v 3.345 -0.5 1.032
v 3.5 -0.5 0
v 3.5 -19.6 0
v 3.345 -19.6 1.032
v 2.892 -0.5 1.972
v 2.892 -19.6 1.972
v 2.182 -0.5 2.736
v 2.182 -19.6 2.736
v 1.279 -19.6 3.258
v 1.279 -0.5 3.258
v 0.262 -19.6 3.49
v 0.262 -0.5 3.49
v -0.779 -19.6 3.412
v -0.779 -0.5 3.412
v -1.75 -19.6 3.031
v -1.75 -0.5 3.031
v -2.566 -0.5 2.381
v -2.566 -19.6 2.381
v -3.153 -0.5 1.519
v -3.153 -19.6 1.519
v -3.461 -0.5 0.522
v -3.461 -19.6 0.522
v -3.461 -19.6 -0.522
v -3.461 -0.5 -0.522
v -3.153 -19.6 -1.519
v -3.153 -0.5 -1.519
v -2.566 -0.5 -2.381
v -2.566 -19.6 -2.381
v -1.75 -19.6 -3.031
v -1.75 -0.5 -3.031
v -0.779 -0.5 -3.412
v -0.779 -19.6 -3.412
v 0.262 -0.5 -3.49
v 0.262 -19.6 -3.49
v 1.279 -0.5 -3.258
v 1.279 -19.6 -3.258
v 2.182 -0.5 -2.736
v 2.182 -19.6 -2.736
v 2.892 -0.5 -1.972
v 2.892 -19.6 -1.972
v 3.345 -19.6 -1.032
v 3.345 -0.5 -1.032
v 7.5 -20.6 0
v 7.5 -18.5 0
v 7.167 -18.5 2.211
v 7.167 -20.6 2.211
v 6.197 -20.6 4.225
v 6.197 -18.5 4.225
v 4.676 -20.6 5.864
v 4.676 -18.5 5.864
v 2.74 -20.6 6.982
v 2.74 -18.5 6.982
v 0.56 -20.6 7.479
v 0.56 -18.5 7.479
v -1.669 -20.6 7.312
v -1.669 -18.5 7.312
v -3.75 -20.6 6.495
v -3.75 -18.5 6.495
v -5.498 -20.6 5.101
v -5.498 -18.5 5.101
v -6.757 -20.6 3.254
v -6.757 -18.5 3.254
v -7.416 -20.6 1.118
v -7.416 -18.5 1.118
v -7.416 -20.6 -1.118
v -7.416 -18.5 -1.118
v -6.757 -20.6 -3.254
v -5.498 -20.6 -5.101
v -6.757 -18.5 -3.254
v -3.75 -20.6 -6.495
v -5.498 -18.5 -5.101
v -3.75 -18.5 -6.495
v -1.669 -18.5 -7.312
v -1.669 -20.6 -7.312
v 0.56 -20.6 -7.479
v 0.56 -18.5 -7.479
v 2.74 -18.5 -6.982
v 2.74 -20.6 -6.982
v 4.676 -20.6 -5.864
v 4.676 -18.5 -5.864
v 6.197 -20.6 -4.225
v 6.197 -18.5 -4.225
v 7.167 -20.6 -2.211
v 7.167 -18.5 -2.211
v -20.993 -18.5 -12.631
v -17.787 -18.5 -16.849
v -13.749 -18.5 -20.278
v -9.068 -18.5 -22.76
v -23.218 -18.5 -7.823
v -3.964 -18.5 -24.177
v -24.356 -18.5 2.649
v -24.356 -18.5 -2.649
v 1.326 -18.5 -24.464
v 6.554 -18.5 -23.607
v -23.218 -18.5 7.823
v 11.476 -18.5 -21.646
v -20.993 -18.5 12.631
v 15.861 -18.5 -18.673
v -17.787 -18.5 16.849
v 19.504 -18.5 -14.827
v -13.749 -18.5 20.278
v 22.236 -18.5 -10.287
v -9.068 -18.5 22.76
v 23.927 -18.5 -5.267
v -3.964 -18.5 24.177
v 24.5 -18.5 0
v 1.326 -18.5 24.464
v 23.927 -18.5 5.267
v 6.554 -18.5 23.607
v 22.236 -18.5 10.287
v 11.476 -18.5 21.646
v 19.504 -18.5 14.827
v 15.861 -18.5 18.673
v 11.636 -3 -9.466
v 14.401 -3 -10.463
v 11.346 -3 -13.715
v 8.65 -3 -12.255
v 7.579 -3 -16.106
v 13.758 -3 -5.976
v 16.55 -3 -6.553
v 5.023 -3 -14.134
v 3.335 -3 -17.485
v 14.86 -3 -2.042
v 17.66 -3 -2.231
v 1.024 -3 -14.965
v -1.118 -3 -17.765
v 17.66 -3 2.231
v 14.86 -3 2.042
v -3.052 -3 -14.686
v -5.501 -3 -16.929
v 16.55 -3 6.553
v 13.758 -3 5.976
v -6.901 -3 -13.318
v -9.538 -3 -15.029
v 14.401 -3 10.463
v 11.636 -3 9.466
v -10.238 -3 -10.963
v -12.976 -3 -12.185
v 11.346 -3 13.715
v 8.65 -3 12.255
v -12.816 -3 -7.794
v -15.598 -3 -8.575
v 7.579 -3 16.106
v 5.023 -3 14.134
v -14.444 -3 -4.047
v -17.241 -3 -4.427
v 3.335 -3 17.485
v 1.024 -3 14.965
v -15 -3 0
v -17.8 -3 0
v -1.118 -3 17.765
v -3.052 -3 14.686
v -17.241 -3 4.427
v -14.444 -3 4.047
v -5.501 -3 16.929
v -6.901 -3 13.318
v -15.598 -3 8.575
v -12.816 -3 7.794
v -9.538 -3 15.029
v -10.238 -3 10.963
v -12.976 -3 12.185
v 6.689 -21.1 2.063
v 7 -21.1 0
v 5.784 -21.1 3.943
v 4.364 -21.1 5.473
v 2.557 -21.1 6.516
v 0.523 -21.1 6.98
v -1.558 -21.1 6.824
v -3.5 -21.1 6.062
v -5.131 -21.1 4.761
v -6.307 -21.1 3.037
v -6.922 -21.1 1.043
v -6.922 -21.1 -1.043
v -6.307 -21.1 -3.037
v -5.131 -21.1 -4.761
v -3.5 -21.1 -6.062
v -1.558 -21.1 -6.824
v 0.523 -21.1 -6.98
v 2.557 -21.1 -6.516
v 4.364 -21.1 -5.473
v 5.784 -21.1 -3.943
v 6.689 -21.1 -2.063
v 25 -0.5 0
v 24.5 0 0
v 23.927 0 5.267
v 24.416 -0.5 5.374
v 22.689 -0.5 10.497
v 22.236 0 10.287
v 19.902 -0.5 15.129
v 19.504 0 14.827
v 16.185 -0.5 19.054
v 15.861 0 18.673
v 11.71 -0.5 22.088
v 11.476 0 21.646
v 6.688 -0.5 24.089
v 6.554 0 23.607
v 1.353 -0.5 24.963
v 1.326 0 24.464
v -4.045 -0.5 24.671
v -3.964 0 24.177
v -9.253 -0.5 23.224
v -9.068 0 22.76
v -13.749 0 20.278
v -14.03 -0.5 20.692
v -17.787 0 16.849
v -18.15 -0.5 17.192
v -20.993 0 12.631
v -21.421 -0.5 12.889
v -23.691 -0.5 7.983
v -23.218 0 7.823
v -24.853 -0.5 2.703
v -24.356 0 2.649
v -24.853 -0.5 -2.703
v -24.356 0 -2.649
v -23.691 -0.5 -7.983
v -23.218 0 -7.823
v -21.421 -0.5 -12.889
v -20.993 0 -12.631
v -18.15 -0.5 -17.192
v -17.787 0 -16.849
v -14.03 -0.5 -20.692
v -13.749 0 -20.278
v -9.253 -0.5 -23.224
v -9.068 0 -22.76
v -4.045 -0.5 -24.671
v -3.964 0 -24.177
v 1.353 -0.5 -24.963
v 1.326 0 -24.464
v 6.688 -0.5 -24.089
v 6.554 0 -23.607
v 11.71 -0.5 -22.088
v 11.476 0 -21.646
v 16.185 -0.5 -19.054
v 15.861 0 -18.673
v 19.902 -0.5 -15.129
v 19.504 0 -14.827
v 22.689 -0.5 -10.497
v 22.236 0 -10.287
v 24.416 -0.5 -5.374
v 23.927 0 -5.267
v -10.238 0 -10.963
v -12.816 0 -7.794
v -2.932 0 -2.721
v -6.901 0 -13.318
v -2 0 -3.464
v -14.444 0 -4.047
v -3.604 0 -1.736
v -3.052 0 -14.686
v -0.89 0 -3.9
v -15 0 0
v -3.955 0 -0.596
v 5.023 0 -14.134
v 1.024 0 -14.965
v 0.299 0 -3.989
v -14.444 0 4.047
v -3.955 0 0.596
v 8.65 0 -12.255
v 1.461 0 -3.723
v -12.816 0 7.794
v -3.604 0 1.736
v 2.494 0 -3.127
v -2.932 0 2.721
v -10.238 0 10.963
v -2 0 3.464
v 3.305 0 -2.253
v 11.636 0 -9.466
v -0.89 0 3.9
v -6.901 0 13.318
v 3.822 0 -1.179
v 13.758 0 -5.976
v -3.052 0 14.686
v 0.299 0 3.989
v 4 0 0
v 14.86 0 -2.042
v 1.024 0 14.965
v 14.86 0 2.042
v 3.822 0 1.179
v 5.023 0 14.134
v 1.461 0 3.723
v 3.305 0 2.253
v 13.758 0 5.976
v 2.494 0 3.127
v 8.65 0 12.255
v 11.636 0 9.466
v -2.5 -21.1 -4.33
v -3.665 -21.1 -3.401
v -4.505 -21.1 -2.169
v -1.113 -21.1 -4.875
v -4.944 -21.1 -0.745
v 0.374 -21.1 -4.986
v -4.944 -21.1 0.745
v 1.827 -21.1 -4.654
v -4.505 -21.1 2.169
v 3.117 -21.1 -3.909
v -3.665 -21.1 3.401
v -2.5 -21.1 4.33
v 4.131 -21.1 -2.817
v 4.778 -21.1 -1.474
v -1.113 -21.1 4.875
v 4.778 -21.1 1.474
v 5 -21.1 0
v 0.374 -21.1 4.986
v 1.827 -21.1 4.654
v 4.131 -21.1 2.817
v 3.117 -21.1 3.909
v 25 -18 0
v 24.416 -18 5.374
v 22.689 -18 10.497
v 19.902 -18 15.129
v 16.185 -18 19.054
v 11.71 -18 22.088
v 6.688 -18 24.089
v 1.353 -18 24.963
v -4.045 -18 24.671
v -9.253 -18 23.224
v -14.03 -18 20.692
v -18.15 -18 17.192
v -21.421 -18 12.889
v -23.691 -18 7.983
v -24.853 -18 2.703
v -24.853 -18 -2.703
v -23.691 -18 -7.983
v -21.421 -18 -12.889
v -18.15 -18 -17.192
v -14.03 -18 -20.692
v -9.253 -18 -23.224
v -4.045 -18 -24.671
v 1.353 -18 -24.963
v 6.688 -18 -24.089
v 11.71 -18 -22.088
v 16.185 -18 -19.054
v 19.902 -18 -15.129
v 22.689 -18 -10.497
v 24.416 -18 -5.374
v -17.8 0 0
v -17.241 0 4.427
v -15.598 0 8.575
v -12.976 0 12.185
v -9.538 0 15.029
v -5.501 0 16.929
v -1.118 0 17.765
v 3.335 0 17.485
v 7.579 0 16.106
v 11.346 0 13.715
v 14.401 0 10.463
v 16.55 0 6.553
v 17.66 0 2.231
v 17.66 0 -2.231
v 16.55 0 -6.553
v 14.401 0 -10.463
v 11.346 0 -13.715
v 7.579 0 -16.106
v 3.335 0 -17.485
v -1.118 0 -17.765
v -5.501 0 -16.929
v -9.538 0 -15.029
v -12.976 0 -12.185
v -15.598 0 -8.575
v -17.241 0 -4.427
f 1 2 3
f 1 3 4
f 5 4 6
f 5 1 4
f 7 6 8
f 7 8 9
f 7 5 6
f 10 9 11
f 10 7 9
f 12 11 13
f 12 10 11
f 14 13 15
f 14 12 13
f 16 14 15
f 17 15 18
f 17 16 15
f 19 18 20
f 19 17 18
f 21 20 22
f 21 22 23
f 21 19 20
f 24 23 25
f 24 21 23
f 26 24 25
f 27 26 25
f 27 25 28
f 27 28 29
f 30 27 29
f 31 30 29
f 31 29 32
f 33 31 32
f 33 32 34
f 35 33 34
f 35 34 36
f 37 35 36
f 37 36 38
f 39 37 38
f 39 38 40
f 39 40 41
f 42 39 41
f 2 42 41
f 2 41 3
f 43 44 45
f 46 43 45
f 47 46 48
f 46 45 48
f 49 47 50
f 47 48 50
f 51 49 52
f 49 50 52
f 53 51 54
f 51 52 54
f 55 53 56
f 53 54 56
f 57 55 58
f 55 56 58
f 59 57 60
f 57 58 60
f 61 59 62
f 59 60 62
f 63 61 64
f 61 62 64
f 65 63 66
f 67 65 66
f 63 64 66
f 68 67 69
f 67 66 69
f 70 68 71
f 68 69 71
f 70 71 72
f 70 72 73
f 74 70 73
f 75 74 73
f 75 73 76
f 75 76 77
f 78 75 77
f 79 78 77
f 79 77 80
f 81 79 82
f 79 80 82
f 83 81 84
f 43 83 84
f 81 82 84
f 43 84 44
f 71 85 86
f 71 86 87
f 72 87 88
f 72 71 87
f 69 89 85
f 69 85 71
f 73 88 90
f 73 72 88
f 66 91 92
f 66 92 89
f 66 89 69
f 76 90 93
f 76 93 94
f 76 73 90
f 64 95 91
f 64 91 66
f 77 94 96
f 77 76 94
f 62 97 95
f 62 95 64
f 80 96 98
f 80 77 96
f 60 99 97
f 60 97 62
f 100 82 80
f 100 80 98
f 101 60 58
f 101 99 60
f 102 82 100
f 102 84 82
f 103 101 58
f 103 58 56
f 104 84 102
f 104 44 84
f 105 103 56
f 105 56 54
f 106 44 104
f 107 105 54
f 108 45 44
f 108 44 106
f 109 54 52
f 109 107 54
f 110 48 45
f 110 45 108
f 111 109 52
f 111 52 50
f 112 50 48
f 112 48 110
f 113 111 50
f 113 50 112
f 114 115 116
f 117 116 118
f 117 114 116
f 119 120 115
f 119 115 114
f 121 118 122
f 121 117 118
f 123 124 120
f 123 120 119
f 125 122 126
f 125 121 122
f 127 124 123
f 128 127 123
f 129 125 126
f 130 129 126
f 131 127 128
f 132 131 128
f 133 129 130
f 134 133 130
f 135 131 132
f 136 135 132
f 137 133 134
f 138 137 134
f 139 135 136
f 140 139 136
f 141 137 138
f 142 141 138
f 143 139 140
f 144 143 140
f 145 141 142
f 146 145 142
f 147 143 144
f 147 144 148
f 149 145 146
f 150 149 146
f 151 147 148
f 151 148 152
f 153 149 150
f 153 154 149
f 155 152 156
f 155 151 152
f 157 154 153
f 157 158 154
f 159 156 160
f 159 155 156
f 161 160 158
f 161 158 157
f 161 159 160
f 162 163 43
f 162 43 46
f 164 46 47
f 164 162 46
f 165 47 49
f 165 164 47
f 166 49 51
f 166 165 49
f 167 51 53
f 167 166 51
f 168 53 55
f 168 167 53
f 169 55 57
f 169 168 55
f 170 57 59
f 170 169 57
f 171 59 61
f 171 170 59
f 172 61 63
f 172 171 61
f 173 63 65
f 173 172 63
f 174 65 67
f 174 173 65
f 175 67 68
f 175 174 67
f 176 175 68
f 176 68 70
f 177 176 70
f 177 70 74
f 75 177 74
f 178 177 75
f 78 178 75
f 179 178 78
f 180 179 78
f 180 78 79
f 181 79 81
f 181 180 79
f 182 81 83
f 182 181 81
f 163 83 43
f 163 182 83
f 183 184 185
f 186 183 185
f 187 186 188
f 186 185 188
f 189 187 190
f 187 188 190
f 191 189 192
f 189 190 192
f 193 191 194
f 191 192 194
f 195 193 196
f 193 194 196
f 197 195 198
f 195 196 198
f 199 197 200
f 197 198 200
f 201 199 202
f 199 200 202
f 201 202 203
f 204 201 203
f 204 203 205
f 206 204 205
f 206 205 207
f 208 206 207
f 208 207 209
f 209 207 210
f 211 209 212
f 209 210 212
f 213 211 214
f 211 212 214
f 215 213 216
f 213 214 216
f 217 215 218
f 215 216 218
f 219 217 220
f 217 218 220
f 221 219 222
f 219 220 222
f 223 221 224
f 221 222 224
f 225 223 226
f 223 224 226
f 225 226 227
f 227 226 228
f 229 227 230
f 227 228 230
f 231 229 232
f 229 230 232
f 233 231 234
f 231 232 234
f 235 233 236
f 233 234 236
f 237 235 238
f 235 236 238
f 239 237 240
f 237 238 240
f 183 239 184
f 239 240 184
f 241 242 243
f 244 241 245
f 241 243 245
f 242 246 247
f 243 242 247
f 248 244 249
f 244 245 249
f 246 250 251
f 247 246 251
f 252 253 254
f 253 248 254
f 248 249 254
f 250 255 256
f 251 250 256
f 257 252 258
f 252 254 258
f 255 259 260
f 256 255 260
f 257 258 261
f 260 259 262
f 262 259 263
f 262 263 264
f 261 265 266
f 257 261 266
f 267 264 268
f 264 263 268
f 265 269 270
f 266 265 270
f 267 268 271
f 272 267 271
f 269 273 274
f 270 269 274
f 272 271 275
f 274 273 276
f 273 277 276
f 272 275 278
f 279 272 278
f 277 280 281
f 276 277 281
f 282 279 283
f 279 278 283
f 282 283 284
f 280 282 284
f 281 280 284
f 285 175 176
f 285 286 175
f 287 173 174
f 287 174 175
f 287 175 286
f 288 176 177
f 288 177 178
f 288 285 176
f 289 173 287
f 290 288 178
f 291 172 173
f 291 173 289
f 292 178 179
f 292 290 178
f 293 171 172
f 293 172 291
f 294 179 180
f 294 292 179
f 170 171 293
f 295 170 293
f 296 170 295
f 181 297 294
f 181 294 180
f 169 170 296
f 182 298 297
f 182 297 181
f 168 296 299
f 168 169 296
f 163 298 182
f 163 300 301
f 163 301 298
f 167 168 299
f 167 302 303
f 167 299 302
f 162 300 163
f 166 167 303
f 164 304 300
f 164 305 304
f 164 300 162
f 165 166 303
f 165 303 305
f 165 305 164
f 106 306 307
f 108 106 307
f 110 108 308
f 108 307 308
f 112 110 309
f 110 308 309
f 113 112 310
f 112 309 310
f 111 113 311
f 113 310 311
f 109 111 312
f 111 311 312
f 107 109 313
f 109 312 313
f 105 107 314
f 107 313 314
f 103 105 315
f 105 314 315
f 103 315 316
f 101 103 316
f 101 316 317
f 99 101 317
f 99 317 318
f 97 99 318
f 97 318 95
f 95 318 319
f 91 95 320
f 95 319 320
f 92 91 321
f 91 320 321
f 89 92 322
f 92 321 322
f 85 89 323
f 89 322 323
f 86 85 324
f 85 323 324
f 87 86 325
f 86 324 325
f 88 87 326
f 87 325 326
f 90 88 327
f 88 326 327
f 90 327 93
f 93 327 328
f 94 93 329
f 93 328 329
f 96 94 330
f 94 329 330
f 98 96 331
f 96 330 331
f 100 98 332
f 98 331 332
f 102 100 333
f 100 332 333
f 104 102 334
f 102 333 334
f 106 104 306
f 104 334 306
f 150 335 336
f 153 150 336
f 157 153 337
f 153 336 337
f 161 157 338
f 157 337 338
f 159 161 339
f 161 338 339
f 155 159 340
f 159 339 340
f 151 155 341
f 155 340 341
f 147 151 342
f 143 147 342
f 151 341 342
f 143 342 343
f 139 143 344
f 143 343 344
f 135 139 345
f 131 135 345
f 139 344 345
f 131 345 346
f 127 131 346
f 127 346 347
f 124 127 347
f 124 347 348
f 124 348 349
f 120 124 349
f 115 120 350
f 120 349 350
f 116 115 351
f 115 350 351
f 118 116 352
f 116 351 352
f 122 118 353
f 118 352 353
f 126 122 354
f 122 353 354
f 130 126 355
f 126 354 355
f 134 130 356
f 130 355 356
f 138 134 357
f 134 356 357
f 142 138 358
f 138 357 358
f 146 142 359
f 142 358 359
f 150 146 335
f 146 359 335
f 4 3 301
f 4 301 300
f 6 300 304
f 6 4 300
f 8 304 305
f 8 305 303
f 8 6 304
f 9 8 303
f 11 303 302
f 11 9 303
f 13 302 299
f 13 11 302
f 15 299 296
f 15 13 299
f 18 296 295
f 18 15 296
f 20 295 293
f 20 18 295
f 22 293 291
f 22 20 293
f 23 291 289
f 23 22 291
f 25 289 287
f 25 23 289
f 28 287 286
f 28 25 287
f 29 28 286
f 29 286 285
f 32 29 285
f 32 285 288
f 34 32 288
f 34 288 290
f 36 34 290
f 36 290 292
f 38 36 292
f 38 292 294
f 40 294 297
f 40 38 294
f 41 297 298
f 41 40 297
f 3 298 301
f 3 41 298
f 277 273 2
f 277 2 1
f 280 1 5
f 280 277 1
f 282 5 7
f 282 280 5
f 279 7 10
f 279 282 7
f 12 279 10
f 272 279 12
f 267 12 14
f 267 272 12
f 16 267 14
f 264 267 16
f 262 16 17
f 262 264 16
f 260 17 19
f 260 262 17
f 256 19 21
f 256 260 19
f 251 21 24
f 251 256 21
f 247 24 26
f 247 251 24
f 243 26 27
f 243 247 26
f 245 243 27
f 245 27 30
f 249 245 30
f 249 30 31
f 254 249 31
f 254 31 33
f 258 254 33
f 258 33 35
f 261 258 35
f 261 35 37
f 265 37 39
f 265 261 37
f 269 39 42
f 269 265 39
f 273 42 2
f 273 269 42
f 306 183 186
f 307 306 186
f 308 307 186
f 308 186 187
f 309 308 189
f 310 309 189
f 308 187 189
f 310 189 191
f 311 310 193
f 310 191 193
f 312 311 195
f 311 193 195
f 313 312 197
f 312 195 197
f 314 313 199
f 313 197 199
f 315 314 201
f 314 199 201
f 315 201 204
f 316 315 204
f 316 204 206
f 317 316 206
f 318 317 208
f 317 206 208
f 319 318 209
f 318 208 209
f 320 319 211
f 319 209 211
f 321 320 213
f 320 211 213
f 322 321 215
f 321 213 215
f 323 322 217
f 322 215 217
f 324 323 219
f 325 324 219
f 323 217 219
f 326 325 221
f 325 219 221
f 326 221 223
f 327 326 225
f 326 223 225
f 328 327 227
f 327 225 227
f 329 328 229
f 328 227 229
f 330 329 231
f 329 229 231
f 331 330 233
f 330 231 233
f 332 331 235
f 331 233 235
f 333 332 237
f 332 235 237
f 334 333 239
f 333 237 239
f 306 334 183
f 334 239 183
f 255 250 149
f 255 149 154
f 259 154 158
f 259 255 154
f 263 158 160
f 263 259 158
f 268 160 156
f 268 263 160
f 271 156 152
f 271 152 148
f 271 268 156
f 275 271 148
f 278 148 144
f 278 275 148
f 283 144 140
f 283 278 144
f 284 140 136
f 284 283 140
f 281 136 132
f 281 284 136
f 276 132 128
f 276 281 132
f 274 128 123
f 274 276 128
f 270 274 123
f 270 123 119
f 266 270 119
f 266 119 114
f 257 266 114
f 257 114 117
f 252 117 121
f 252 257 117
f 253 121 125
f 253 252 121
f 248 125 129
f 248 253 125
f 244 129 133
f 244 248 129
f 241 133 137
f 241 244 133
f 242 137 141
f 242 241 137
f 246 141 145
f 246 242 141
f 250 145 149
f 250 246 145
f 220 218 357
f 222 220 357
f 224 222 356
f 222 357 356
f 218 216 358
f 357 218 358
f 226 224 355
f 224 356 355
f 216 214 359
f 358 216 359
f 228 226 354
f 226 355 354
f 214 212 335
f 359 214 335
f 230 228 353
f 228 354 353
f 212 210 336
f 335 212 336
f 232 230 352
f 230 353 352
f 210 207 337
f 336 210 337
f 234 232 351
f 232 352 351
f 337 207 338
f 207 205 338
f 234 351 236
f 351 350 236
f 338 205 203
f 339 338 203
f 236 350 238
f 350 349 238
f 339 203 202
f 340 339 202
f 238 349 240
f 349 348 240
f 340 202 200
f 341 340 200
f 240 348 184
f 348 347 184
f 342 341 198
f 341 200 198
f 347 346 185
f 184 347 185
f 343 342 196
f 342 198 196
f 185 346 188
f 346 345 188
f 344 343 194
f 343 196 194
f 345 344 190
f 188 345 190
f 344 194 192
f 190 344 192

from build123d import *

# Parameters (mm, degrees)
F0_R     = 25
F0_R_2   = 3.5
F1_DEPTH = 18.5
F2_R     = 7.5
F2_R_2   = 3.5
F3_DEPTH = 2.6
F4_R     = 17.8
F4_R_2   = 15
F5_DEPTH = 3
F6_SIZE2 = 0.5
F6_SIZE  = 0.5
F7_SIZE  = 1.5


with BuildPart() as f1:
    # F0 (on Front) → F1 (new body)
    with BuildSketch(Plane.XZ):
        Circle(F0_R)
        Circle(F0_R_2, mode=Mode.SUBTRACT)
    extrude(amount=F1_DEPTH)

    # F2 (on face) → F3 (join)
    with BuildSketch(Plane.XZ.offset(18.5)):
        Circle(F2_R)
        Circle(F2_R_2, mode=Mode.SUBTRACT)
    extrude(amount=F3_DEPTH)

    # F4 (on face) → F5 (cut)
    with BuildSketch(Plane(origin=(0, 0, 0), x_dir=(-1, 0, 0), z_dir=(0, 1, 0))):
        Circle(F4_R)
        Circle(F4_R_2, mode=Mode.SUBTRACT)
    extrude(amount=-F5_DEPTH, mode=Mode.SUBTRACT)

    # F6
    f6_edges = [f1.edges().sort_by_distance(p)[0] for p in [
        (-25, 0, 0),
        (-25, -18.5, 0),
        (-3.5, 0, 0),
        (-7.5, -21.1, 0),
    ]]
    chamfer(f6_edges, length=F6_SIZE, length2=F6_SIZE2)

    # F7
    f7_edges = [f1.edges().sort_by_distance(p)[0] for p in [
        (-3.5, -21.1, 0),
    ]]
    chamfer(f7_edges, length=F7_SIZE)


solid = f1.part
